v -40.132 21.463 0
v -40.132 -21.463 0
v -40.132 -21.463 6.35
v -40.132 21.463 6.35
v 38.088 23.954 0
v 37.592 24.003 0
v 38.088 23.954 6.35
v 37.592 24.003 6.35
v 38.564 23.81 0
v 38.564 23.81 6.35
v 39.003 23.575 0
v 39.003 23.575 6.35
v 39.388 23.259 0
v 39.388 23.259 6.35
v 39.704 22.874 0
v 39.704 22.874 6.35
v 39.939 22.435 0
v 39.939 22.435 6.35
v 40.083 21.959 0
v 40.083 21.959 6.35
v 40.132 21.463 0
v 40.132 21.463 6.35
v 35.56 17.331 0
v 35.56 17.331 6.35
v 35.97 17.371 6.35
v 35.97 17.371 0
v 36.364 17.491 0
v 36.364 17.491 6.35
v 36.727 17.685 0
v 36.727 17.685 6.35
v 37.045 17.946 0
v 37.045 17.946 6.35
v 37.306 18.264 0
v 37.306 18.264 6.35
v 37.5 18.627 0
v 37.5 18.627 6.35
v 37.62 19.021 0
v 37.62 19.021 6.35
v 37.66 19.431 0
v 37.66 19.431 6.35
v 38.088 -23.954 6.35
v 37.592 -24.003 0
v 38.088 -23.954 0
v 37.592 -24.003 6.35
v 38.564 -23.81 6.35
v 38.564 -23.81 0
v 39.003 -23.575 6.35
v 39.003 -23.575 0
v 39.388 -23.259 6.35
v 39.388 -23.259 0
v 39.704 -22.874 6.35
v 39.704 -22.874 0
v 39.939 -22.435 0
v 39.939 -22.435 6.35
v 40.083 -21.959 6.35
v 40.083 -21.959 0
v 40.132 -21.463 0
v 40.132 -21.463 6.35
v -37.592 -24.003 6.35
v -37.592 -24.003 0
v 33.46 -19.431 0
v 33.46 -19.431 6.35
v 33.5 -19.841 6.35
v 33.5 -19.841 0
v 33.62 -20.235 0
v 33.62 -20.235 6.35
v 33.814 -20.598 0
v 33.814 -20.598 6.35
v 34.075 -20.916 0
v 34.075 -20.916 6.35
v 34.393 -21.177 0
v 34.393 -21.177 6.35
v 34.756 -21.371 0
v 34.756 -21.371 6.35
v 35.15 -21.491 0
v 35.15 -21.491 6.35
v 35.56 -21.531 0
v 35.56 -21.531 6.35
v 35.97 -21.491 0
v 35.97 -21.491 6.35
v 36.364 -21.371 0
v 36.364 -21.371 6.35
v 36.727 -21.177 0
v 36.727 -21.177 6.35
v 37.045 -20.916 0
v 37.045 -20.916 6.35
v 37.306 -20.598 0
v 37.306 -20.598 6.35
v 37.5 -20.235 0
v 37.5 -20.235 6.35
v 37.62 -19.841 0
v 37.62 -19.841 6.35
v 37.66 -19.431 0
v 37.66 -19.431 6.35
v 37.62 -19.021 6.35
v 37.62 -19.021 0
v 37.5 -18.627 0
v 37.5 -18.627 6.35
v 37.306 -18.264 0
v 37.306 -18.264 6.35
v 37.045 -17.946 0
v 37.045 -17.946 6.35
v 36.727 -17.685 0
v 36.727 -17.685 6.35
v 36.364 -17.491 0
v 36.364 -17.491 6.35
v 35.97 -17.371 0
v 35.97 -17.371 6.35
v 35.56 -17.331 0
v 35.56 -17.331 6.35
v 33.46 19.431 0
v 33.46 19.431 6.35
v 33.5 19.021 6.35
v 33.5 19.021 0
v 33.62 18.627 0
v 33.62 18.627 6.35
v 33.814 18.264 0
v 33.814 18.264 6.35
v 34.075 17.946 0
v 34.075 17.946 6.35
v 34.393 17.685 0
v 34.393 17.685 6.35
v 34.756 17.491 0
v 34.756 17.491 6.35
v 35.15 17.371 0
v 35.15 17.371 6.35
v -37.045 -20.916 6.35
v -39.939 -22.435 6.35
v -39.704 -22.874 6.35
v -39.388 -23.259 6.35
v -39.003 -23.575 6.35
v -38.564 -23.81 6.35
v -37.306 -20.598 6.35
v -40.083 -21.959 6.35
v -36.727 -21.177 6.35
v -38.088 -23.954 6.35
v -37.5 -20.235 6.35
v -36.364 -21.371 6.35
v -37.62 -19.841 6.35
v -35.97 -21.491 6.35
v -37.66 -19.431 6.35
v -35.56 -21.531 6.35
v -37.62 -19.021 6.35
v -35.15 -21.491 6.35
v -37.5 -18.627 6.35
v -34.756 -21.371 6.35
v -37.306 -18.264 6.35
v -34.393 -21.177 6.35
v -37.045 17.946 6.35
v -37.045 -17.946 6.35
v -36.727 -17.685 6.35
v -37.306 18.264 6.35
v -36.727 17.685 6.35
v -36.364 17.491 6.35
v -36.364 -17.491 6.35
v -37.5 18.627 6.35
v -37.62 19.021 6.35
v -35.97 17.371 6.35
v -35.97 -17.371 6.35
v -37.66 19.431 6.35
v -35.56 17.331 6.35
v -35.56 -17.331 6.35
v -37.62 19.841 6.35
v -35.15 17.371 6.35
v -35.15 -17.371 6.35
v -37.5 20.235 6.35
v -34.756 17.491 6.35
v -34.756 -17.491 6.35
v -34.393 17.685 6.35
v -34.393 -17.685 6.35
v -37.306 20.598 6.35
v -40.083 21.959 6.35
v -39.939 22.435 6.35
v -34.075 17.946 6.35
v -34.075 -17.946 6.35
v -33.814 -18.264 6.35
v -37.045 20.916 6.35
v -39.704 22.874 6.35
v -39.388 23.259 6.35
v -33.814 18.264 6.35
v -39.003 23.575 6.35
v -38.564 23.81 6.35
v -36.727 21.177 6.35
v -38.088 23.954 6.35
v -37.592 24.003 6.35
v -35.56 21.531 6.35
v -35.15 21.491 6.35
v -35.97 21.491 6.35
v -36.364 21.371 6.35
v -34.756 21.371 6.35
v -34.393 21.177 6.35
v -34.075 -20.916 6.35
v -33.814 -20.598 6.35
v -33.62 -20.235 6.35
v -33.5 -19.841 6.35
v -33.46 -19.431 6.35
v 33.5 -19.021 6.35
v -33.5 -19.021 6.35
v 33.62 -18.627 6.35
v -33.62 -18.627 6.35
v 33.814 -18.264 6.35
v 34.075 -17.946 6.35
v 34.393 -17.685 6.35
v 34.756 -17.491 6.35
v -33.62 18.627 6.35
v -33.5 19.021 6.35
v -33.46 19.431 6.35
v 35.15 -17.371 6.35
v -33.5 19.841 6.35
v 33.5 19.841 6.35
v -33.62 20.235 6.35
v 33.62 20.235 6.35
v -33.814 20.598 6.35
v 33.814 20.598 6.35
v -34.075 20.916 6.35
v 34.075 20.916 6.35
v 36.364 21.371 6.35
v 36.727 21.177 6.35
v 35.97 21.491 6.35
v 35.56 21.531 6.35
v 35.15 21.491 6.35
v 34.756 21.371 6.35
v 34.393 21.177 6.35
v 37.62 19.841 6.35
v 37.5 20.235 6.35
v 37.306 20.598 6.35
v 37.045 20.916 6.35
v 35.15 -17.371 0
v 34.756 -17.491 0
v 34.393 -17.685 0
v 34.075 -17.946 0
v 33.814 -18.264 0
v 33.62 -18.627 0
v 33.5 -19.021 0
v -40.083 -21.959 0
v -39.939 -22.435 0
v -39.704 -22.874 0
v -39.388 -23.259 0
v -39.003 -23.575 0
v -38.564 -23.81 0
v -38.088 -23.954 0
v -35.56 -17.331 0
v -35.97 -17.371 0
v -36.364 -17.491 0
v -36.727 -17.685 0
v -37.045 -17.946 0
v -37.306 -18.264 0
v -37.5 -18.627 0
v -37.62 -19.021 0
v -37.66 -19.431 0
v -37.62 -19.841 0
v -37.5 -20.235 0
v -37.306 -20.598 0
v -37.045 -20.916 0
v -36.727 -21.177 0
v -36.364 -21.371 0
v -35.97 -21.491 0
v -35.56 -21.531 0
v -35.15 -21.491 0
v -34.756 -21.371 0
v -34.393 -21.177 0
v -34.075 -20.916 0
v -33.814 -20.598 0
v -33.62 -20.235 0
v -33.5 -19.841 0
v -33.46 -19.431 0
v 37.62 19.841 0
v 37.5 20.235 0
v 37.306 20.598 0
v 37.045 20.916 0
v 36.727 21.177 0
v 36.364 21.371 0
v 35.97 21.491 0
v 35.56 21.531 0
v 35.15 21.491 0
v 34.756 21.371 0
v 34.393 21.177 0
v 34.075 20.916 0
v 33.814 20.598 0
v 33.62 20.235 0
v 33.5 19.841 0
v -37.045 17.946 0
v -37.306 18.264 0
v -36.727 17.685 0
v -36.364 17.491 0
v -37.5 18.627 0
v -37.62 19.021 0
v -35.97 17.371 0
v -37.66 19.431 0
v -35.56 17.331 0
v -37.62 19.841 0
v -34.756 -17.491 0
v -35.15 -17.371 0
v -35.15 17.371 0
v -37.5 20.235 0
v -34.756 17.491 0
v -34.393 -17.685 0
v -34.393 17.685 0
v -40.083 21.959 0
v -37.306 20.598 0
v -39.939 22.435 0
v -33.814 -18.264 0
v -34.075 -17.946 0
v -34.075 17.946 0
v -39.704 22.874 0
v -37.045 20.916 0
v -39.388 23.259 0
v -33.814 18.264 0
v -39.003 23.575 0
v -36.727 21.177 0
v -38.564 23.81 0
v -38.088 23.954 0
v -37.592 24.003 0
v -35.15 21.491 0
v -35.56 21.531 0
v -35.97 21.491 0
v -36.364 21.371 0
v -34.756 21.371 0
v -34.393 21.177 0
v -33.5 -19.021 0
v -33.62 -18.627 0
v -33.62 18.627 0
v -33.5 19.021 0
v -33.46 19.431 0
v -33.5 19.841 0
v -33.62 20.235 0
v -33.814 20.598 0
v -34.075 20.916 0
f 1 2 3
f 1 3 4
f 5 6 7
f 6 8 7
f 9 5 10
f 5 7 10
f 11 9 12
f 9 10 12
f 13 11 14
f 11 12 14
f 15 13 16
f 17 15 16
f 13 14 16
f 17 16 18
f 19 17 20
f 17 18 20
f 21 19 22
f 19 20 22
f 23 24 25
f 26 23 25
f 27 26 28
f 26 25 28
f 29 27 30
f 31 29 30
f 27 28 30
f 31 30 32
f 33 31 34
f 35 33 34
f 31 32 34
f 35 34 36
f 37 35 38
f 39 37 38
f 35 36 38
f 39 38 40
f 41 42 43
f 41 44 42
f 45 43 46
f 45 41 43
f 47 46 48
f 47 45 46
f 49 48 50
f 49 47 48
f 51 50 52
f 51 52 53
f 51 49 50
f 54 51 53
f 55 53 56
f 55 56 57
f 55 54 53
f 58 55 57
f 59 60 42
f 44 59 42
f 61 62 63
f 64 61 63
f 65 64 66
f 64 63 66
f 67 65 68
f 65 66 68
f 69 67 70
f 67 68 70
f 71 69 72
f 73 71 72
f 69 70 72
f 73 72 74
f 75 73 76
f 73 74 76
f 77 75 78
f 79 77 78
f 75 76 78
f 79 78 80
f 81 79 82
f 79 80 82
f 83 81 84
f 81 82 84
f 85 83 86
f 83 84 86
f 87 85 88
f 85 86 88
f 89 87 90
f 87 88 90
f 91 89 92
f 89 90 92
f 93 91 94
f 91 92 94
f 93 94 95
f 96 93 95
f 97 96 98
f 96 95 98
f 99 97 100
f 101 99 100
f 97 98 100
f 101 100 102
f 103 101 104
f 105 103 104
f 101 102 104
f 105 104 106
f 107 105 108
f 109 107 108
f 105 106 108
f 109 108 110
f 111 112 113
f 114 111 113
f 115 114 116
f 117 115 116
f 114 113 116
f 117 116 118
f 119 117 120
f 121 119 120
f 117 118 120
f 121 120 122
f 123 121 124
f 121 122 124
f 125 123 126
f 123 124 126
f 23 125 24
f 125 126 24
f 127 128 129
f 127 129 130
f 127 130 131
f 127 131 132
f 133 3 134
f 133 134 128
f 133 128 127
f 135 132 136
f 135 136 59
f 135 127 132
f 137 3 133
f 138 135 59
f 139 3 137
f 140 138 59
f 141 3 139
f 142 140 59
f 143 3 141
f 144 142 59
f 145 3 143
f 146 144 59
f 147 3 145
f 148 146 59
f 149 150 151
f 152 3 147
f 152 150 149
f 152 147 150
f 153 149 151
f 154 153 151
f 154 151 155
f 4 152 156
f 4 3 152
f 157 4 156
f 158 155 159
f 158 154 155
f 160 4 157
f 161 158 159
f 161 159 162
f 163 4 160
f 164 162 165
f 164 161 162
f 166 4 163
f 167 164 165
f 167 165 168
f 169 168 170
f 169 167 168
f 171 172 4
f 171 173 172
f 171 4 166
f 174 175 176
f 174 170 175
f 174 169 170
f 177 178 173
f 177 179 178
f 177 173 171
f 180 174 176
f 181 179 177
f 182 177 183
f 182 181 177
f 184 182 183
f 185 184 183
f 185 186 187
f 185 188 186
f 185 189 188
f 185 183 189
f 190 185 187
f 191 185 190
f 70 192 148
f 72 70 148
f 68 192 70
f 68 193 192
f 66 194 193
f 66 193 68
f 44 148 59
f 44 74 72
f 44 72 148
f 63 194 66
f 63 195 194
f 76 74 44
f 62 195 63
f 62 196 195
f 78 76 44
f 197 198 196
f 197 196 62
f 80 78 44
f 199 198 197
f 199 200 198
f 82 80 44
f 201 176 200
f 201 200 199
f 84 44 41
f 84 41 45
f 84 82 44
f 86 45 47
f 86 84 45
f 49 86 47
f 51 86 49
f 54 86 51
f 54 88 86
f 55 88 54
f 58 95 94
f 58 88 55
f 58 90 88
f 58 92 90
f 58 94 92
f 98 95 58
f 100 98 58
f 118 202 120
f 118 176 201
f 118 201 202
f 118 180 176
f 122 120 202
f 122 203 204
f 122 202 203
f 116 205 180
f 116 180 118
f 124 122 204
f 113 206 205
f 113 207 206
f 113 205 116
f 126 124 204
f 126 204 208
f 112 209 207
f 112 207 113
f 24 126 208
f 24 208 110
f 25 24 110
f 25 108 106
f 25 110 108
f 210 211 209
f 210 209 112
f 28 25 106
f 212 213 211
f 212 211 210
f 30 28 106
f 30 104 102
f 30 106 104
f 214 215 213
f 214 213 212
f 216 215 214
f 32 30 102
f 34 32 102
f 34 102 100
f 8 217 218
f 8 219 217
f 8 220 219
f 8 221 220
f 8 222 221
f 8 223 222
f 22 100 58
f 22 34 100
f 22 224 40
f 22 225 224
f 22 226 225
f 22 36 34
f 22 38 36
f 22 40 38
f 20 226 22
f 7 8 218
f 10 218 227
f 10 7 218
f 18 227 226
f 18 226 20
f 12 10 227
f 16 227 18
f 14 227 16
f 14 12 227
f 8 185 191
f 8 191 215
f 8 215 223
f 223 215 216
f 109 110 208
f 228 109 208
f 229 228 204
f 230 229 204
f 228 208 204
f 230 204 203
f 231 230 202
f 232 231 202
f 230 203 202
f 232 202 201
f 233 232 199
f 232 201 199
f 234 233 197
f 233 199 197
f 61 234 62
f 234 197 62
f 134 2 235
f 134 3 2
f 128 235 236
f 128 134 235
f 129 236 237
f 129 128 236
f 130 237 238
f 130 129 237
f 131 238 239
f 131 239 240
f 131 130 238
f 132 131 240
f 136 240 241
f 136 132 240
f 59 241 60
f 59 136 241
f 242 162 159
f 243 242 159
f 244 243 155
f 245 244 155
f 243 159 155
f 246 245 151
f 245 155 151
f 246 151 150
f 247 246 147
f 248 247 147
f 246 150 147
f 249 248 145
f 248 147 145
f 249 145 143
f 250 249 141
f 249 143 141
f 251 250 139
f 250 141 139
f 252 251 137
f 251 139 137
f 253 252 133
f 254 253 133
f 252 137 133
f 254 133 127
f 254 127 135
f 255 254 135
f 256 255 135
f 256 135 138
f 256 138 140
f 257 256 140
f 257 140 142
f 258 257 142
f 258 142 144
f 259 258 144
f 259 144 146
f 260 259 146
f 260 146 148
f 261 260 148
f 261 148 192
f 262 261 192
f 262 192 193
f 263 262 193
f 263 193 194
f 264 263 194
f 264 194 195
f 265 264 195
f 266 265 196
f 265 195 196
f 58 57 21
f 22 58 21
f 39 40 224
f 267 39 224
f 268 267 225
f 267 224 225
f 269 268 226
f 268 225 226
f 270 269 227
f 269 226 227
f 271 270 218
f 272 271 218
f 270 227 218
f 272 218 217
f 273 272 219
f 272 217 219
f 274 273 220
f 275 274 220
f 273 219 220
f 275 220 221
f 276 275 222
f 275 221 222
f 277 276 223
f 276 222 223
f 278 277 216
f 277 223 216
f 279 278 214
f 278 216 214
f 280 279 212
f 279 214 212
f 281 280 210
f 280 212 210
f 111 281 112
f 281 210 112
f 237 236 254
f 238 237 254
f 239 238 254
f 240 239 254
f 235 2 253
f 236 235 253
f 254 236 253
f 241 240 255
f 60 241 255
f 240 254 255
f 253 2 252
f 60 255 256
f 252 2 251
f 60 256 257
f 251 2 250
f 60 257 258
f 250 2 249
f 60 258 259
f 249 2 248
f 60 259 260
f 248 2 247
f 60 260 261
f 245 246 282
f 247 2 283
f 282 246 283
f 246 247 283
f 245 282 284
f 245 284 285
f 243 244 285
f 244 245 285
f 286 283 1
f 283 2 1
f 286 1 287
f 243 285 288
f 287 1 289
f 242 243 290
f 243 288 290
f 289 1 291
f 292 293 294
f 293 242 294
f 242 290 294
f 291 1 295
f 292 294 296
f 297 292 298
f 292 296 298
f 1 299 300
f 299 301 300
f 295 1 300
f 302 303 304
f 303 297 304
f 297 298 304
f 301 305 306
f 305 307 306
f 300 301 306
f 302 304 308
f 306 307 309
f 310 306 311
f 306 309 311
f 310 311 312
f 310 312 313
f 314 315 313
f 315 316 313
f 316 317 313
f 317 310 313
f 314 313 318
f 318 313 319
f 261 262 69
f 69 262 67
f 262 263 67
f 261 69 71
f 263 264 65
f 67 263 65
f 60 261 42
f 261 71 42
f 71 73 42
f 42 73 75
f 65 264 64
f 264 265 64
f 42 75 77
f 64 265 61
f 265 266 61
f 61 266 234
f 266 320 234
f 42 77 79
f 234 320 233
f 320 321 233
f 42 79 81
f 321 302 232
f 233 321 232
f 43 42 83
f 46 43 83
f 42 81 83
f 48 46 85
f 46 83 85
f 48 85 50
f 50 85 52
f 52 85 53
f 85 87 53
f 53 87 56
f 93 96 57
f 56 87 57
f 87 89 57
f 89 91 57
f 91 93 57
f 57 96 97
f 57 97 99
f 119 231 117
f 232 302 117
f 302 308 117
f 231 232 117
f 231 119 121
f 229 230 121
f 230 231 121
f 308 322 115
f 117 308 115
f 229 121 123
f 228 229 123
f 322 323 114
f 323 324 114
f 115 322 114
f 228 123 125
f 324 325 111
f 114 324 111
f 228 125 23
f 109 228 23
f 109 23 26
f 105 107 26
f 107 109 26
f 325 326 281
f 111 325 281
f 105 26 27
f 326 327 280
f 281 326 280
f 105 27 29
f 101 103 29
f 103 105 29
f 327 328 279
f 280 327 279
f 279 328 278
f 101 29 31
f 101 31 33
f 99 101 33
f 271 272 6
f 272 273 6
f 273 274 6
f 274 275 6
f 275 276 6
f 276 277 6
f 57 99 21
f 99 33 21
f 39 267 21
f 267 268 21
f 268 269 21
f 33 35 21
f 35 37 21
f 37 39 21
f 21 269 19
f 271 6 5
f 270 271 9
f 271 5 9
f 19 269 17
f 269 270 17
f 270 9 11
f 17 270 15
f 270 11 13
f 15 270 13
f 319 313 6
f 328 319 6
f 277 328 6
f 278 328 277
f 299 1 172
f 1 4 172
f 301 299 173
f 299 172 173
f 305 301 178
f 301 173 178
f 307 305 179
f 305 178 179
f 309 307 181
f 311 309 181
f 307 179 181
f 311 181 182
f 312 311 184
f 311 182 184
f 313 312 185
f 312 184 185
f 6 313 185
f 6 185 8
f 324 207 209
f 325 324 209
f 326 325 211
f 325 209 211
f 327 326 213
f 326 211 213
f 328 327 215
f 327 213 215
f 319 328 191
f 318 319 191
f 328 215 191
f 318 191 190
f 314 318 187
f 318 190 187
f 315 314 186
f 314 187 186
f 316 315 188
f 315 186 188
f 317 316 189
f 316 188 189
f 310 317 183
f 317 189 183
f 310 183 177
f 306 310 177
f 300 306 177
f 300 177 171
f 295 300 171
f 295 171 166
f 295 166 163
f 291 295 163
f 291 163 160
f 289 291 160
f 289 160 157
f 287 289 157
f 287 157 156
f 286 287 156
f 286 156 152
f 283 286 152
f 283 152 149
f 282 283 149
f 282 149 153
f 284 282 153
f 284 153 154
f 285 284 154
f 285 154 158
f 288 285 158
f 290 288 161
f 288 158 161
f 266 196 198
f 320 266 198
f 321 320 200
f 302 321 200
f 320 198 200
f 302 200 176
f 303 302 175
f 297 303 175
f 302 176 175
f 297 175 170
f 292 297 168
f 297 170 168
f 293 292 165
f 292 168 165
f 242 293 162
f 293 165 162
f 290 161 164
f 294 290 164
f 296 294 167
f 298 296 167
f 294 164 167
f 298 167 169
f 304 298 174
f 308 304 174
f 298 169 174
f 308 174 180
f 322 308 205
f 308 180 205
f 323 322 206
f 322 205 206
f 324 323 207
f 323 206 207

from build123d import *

# Parameters (mm, degrees)
SKETCH1_W           = 80.264
SKETCH1_H           = 48.006
SKETCH1_W_2         = 71.12
SKETCH1_H_2         = 38.862
BOSS_EXTRUDE1_DEPTH = 6.35
CUT_EXTRUDE2_DEPTH  = 48.191566333
FILLET1_R           = 2.54


with BuildPart() as part:
    # Sketch1 → Boss-Extrude1 (new body)
    # profile 1 of 2: a face of its own
    with BuildSketch(Plane.XY):
        Rectangle(SKETCH1_W, SKETCH1_H)
        Rectangle(SKETCH1_W_2, SKETCH1_H_2, mode=Mode.SUBTRACT)
    # profile 2 of 2: a face of its own
    with BuildSketch(Plane.XY):
        Rectangle(SKETCH1_W_2, SKETCH1_H_2)
    extrude(amount=BOSS_EXTRUDE1_DEPTH)

    # Sketch2 → Cut-Extrude2 (cut, through all)
    with BuildSketch(Plane.XY.offset(6.35)):
        with BuildLine():
            ThreePointArc((-33.459999882, 19.431), (-37.044924324, 20.915924324), (-35.56, 17.330999882))
            Line((-35.56, 17.330999882), (-35.56, 19.431))
            Line((-35.56, 19.431), (-33.459999882, 19.431))
        make_face()
        with BuildLine():
            Line((-35.56, 19.431), (-35.56, 17.330999882))
            ThreePointArc((-35.56, 17.330999882), (-34.075075676, 17.946075676), (-33.459999882, 19.431))
            Line((-33.459999882, 19.431), (-35.56, 19.431))
        make_face()
        with BuildLine():
            Line((-35.56, -17.330999882), (-35.56, -19.431))
            Line((-35.56, -19.431), (-33.459999882, -19.431))
            ThreePointArc((-33.459999882, -19.431), (-34.075075676, -17.946075676), (-35.56, -17.330999882))
        make_face()
        with BuildLine():
            Line((-33.459999882, -19.431), (-35.56, -19.431))
            Line((-35.56, -19.431), (-35.56, -17.330999882))
            ThreePointArc((-35.56, -17.330999882), (-37.044924324, -20.915924324), (-33.459999882, -19.431))
        make_face()
        with BuildLine():
            ThreePointArc((33.459999882, 19.431), (34.075075676, 17.946075676), (35.56, 17.330999882))
            Line((35.56, 17.330999882), (35.56, 19.431))
            Line((35.56, 19.431), (33.459999882, 19.431))
        make_face()
        with BuildLine():
            Line((35.56, 19.431), (35.56, 17.330999882))
            ThreePointArc((35.56, 17.330999882), (37.044924324, 17.946075676), (37.660000118, 19.431))
            ThreePointArc((37.660000118, 19.431), (35.56, 21.531000118), (33.459999882, 19.431))
            Line((33.459999882, 19.431), (35.56, 19.431))
        make_face()
        with BuildLine():
            ThreePointArc((35.56, -17.330999882), (34.075075676, -17.946075676), (33.459999882, -19.431))
            Line((33.459999882, -19.431), (35.56, -19.431))
            Line((35.56, -19.431), (35.56, -17.330999882))
        make_face()
        with BuildLine():
            Line((35.56, -19.431), (33.459999882, -19.431))
            ThreePointArc((33.459999882, -19.431), (35.56, -21.531000118), (37.660000118, -19.431))
            ThreePointArc((37.660000118, -19.431), (37.044924324, -17.946075676), (35.56, -17.330999882))
            Line((35.56, -17.330999882), (35.56, -19.431))
        make_face()
    extrude(amount=-CUT_EXTRUDE2_DEPTH, mode=Mode.SUBTRACT)

    # Fillet1
    fillet1_edges = [part.edges().sort_by_distance(p)[0] for p in [
        (-40.132, -24.003, 3.175),
        (-40.132, 24.003, 3.175),
        (40.132, 24.003, 3.175),
        (40.132, -24.003, 3.175),
    ]]
    fillet(fillet1_edges, radius=FILLET1_R)


solid = part.part
